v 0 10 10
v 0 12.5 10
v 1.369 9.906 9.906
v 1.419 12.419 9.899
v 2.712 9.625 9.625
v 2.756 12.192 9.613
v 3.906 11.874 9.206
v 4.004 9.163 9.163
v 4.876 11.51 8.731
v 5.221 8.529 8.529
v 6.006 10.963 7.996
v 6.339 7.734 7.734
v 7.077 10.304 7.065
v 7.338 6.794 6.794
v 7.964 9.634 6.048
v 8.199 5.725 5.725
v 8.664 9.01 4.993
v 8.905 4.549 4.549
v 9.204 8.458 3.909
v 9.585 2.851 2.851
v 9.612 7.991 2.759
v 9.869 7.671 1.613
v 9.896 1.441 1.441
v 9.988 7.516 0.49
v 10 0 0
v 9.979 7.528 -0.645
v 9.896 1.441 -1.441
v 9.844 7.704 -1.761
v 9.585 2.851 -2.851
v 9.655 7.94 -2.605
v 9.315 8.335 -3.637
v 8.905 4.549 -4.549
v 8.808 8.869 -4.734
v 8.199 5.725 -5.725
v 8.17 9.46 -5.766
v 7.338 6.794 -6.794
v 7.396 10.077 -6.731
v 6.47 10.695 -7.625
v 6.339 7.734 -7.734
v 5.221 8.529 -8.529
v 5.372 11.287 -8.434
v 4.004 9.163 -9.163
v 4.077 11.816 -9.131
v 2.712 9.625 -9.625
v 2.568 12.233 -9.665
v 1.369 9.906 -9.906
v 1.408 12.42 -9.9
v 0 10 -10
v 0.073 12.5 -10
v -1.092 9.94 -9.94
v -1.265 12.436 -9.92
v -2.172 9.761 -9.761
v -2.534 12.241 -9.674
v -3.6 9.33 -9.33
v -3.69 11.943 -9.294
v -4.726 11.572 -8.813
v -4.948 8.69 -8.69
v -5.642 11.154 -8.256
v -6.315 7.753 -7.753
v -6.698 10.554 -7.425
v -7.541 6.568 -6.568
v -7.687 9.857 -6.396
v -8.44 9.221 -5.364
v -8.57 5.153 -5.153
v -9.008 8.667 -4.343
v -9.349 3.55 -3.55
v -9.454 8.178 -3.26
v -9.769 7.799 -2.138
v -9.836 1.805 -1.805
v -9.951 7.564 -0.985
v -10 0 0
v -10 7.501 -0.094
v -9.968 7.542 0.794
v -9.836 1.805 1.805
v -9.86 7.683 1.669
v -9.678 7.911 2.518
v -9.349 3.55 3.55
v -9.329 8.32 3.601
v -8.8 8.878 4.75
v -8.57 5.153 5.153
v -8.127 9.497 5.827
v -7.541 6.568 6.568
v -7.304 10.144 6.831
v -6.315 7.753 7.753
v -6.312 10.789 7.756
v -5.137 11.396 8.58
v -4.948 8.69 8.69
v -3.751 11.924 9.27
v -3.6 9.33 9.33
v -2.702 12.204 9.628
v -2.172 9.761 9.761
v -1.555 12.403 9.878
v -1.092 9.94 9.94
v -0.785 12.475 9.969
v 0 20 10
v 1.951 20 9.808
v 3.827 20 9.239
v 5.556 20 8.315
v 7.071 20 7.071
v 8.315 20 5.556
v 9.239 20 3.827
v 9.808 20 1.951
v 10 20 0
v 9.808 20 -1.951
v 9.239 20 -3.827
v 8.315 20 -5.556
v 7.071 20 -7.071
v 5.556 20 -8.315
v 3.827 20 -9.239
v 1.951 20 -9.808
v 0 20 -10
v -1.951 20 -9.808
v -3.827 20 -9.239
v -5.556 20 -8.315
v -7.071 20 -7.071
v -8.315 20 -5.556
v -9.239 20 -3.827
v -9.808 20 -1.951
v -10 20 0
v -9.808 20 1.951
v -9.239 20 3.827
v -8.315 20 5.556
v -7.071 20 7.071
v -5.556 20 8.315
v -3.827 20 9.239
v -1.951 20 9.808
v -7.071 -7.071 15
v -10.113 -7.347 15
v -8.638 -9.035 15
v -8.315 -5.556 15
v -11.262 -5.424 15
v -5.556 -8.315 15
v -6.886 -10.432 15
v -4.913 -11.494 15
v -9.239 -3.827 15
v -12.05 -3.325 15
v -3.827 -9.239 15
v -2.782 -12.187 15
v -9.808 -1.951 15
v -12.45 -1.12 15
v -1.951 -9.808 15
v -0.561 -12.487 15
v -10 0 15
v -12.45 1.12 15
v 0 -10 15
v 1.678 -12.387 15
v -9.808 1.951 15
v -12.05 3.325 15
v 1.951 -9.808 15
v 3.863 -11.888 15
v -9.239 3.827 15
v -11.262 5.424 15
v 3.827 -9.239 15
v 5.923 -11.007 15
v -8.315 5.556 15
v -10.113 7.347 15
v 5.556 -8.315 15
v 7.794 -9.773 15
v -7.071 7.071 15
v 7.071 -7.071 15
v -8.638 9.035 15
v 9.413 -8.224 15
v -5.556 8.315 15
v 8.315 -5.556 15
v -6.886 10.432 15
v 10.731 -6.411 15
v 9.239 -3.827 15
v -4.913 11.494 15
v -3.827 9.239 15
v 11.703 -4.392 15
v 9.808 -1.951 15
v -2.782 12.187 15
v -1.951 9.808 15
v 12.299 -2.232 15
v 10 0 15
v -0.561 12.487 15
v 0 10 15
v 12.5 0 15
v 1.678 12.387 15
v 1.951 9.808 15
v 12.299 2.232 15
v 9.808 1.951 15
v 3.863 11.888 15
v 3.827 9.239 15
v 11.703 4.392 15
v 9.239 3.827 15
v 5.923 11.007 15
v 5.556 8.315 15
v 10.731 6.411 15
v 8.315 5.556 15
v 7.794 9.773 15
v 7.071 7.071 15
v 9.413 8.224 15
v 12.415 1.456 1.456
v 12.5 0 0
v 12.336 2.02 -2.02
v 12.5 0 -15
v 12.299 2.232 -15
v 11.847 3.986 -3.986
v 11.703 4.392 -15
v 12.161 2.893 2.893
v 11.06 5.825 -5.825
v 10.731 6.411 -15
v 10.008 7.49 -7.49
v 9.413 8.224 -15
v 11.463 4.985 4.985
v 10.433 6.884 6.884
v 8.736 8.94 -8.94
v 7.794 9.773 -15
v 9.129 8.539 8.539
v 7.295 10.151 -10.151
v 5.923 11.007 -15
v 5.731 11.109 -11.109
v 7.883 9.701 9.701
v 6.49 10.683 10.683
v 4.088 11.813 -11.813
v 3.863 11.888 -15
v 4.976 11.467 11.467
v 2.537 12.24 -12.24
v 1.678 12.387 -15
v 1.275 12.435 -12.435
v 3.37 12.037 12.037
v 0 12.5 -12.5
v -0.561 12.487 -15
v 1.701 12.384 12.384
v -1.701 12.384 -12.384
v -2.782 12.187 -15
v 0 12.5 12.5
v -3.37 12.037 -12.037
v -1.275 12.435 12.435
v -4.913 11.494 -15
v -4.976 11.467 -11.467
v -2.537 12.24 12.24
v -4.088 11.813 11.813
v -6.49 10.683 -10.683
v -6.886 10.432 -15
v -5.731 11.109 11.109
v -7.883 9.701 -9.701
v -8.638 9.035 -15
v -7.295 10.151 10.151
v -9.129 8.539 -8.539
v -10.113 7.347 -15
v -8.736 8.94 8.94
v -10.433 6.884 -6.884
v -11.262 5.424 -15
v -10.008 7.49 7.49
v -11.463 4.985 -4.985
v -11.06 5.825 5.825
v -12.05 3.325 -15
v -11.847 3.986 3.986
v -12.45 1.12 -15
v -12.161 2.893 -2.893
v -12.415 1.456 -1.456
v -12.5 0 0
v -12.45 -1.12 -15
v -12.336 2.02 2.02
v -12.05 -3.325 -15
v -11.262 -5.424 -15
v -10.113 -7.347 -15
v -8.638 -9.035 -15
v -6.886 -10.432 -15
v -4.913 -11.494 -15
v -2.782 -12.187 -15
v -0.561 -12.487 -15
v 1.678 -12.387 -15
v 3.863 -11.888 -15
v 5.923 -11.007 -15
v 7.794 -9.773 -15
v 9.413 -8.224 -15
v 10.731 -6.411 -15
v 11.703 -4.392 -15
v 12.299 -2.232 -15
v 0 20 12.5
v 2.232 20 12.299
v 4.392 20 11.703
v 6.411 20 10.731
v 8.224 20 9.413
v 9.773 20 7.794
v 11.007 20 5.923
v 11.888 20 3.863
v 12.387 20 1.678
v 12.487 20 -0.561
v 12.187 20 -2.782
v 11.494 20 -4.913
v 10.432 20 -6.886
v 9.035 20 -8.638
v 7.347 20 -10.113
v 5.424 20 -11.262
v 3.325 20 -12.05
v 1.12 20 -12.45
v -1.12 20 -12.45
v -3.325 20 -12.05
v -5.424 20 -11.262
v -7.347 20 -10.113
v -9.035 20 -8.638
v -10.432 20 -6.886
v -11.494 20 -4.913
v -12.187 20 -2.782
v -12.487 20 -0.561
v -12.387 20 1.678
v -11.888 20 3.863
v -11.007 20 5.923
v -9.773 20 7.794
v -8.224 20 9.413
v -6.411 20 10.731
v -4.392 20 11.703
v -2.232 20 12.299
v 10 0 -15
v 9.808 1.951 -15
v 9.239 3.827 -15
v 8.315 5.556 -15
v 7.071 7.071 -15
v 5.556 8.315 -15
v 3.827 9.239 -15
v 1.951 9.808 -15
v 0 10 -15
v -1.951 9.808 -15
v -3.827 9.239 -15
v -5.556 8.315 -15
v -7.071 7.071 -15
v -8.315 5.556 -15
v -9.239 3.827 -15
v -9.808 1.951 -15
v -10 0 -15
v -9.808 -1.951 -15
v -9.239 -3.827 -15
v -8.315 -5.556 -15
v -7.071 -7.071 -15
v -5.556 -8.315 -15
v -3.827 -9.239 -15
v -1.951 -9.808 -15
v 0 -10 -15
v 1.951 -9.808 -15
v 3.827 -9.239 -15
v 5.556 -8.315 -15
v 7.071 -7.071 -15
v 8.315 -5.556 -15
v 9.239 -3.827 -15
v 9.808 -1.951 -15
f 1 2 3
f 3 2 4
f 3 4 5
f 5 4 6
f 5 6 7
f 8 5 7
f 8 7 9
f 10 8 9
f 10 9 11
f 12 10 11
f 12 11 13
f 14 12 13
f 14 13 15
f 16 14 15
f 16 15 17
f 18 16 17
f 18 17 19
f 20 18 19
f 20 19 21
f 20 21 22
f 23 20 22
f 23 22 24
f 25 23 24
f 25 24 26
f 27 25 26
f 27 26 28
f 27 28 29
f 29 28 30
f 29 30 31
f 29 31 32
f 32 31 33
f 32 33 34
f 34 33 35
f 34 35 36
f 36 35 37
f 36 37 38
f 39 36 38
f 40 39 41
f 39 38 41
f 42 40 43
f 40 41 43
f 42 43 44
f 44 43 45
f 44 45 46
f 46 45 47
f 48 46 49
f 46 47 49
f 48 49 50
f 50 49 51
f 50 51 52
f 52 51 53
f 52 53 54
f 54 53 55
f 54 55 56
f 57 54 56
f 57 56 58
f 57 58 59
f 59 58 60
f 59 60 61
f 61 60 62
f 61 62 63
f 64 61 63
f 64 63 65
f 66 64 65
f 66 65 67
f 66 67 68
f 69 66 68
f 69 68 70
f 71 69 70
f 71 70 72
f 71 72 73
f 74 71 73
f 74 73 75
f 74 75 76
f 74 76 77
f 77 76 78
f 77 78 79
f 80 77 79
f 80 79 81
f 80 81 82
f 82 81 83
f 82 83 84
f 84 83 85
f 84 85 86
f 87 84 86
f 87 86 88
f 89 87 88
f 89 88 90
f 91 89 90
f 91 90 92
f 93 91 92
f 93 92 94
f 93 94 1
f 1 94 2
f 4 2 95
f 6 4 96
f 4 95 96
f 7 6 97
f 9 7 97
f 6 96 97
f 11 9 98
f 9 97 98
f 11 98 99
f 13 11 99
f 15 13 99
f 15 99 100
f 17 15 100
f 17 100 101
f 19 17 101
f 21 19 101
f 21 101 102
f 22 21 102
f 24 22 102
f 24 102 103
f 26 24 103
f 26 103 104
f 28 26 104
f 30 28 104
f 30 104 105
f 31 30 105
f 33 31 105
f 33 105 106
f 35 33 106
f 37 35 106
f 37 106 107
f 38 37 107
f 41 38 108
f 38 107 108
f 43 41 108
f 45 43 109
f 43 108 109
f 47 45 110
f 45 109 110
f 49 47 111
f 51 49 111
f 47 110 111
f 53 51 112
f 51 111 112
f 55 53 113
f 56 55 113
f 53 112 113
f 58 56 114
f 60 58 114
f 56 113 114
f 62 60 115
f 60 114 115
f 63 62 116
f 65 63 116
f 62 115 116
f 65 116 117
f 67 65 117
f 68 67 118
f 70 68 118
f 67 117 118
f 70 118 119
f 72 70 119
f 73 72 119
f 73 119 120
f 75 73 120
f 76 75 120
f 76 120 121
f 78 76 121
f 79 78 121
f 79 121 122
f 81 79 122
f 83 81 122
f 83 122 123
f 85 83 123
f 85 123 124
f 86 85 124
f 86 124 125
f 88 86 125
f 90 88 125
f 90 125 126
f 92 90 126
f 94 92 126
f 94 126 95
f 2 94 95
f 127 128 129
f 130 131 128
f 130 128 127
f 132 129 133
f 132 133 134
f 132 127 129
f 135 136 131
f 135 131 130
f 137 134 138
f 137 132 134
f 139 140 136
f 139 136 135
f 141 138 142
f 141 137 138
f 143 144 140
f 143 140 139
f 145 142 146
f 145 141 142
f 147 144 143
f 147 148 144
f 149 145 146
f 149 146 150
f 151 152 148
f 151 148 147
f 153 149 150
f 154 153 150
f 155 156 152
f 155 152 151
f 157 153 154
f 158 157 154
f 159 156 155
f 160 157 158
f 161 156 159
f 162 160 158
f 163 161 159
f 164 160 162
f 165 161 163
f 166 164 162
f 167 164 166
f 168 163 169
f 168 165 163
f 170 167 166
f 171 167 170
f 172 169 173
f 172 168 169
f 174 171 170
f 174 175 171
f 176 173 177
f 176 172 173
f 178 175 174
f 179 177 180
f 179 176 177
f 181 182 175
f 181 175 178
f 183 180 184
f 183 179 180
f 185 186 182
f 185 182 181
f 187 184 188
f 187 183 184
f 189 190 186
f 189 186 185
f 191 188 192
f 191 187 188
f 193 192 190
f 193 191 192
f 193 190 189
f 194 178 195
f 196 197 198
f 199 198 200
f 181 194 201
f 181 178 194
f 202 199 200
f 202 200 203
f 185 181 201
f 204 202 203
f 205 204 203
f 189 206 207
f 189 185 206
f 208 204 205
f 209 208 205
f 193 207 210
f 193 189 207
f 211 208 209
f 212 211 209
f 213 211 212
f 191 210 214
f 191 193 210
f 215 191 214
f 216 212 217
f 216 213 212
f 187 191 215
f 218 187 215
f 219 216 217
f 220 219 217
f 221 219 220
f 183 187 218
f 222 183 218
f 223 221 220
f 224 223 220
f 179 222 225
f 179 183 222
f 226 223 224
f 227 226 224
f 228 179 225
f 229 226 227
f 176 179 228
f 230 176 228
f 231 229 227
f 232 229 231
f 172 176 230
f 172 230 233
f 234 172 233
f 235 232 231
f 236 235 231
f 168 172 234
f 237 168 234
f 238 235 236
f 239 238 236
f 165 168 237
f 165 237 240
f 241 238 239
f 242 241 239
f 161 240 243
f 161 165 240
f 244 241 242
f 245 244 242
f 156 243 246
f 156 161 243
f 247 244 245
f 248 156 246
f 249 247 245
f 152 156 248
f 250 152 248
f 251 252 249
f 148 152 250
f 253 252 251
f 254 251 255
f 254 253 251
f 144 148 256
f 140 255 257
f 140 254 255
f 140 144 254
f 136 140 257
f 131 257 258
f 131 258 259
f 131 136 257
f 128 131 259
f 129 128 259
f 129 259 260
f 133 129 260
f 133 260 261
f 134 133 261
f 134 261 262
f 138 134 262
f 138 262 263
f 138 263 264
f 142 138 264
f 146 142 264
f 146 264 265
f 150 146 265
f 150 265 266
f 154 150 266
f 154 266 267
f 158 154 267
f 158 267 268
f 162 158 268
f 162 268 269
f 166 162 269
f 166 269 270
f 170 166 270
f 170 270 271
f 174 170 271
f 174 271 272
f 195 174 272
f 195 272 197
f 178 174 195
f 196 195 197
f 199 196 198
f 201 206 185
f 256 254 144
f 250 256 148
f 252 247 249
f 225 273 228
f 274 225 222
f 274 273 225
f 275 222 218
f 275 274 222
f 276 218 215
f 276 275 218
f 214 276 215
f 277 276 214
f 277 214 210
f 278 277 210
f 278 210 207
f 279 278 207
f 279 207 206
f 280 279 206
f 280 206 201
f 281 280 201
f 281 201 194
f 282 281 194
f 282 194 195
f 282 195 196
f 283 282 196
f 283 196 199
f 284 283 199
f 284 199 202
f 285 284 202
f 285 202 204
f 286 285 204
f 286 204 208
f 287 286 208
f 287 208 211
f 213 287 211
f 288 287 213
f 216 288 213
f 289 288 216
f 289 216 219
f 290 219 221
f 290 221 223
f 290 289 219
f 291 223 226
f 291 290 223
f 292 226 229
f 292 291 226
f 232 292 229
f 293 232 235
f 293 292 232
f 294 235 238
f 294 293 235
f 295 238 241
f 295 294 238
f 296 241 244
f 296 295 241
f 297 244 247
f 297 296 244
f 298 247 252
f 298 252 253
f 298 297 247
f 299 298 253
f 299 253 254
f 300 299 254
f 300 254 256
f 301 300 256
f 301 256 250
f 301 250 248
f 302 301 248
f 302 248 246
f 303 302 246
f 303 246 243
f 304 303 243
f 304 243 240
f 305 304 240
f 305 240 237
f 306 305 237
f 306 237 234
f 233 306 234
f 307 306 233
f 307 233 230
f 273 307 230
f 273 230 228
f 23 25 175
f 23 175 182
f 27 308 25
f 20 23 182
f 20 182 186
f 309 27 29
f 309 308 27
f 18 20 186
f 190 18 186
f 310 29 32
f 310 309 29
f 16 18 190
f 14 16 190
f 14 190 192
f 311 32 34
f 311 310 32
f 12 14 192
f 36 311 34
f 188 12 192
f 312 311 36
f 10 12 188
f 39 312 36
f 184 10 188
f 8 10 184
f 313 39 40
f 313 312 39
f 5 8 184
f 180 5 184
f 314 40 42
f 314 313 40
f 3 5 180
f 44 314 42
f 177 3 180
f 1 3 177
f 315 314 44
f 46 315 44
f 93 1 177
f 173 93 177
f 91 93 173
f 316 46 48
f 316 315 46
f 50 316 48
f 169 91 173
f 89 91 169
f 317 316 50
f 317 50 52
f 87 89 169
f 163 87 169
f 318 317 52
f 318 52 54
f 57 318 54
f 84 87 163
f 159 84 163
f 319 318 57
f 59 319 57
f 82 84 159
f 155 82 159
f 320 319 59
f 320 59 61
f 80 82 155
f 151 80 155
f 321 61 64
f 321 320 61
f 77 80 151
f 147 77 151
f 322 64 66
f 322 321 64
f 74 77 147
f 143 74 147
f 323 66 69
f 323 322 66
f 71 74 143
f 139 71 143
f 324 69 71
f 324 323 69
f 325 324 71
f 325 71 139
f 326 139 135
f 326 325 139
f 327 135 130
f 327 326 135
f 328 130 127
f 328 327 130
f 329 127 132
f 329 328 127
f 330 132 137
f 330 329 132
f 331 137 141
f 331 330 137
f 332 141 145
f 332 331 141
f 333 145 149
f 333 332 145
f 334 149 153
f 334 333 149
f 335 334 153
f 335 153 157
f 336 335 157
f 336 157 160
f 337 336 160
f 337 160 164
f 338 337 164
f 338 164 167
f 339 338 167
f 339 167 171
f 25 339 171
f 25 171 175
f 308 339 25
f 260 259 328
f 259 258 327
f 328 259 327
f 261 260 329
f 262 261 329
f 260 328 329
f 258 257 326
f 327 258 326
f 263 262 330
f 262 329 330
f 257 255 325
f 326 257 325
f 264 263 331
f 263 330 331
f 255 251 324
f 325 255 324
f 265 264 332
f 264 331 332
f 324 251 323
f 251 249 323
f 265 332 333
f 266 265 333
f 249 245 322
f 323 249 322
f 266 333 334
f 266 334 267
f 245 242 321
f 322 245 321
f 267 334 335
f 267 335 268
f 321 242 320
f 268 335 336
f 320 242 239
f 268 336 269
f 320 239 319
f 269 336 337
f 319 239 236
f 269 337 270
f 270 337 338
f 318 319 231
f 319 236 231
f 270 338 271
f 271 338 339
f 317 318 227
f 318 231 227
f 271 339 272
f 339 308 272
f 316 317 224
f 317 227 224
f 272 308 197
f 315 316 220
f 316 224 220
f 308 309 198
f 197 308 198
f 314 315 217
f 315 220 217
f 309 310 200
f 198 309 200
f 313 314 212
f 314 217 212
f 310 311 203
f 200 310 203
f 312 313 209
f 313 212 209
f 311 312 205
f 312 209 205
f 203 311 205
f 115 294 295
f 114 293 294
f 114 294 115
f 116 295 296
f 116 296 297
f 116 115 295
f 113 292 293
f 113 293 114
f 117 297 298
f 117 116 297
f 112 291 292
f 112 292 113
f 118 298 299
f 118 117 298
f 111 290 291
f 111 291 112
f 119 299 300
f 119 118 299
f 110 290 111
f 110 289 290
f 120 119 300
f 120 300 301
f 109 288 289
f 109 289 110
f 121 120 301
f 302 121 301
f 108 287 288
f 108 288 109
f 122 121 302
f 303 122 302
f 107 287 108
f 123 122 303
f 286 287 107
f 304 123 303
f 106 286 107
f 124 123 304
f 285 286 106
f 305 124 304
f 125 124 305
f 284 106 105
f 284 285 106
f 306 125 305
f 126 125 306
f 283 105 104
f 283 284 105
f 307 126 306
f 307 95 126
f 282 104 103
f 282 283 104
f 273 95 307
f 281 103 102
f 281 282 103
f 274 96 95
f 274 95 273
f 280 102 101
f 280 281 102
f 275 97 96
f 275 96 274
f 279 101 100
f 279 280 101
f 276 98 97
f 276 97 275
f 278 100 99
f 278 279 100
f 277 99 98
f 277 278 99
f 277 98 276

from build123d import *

# Parameters (mm, degrees)
SKETCH_1_R           = 12.5
SKETCH_1_R_2         = 10
EXTRUDE_1_DEPTH      = 15
EXTRUDE_2_REACH      = 39.914
EXTRUDE_2_END_RADIUS = 12.5
SKETCH_2_R           = 12.5
SKETCH_2_R_2         = 10
SKETCH_3_R           = 10
CUT_EXTRUDE_1_DEPTH  = 20


with BuildPart() as part:
    # 草图1 → 凸台-拉伸1 (new, symmetric)
    with BuildSketch(Plane.XY):
        Circle(SKETCH_1_R)
        Circle(SKETCH_1_R_2, mode=Mode.SUBTRACT)
    extrude(amount=EXTRUDE_1_DEPTH, both=True)

    # 凸台-拉伸2: up to this cylinder (the profile starts outside it)
    extrude_2_end = Plane(origin=(0, 0, -12.146447), z_dir=(0, 0, -1)) * Cylinder(EXTRUDE_2_END_RADIUS, 105.828, mode=Mode.PRIVATE)
    # 草图2 → 凸台-拉伸2 (add, up to the surface)
    with BuildSketch(Plane(origin=(0, 20, 0), x_dir=(1, 0, 0), z_dir=(0, 1, 0)), mode=Mode.PRIVATE) as extrude_2_sk1:
        with Locations(Location((0, 0, 0), (0, 0, 270))):
            Circle(SKETCH_2_R)
        with Locations(Location((0, 0, 0), (0, 0, 270))):
            Circle(SKETCH_2_R_2, mode=Mode.SUBTRACT)
    extrude_2_tool1 = extrude(extrude_2_sk1.sketch, amount=-EXTRUDE_2_REACH, mode=Mode.PRIVATE) - extrude_2_end
    add(extrude_2_tool1.solids().sort_by_distance((0, 20, -12.146447))[0])

    # 草图3 → 切除-拉伸1 (cut)
    with BuildSketch(Plane(origin=(0, 20, 0), x_dir=(1, 0, 0), z_dir=(0, 1, 0))):
        with Locations(Location((0, 0, 0), (0, 0, 270))):
            Circle(SKETCH_3_R)
    extrude(amount=-CUT_EXTRUDE_1_DEPTH, mode=Mode.SUBTRACT)


solid = part.part
